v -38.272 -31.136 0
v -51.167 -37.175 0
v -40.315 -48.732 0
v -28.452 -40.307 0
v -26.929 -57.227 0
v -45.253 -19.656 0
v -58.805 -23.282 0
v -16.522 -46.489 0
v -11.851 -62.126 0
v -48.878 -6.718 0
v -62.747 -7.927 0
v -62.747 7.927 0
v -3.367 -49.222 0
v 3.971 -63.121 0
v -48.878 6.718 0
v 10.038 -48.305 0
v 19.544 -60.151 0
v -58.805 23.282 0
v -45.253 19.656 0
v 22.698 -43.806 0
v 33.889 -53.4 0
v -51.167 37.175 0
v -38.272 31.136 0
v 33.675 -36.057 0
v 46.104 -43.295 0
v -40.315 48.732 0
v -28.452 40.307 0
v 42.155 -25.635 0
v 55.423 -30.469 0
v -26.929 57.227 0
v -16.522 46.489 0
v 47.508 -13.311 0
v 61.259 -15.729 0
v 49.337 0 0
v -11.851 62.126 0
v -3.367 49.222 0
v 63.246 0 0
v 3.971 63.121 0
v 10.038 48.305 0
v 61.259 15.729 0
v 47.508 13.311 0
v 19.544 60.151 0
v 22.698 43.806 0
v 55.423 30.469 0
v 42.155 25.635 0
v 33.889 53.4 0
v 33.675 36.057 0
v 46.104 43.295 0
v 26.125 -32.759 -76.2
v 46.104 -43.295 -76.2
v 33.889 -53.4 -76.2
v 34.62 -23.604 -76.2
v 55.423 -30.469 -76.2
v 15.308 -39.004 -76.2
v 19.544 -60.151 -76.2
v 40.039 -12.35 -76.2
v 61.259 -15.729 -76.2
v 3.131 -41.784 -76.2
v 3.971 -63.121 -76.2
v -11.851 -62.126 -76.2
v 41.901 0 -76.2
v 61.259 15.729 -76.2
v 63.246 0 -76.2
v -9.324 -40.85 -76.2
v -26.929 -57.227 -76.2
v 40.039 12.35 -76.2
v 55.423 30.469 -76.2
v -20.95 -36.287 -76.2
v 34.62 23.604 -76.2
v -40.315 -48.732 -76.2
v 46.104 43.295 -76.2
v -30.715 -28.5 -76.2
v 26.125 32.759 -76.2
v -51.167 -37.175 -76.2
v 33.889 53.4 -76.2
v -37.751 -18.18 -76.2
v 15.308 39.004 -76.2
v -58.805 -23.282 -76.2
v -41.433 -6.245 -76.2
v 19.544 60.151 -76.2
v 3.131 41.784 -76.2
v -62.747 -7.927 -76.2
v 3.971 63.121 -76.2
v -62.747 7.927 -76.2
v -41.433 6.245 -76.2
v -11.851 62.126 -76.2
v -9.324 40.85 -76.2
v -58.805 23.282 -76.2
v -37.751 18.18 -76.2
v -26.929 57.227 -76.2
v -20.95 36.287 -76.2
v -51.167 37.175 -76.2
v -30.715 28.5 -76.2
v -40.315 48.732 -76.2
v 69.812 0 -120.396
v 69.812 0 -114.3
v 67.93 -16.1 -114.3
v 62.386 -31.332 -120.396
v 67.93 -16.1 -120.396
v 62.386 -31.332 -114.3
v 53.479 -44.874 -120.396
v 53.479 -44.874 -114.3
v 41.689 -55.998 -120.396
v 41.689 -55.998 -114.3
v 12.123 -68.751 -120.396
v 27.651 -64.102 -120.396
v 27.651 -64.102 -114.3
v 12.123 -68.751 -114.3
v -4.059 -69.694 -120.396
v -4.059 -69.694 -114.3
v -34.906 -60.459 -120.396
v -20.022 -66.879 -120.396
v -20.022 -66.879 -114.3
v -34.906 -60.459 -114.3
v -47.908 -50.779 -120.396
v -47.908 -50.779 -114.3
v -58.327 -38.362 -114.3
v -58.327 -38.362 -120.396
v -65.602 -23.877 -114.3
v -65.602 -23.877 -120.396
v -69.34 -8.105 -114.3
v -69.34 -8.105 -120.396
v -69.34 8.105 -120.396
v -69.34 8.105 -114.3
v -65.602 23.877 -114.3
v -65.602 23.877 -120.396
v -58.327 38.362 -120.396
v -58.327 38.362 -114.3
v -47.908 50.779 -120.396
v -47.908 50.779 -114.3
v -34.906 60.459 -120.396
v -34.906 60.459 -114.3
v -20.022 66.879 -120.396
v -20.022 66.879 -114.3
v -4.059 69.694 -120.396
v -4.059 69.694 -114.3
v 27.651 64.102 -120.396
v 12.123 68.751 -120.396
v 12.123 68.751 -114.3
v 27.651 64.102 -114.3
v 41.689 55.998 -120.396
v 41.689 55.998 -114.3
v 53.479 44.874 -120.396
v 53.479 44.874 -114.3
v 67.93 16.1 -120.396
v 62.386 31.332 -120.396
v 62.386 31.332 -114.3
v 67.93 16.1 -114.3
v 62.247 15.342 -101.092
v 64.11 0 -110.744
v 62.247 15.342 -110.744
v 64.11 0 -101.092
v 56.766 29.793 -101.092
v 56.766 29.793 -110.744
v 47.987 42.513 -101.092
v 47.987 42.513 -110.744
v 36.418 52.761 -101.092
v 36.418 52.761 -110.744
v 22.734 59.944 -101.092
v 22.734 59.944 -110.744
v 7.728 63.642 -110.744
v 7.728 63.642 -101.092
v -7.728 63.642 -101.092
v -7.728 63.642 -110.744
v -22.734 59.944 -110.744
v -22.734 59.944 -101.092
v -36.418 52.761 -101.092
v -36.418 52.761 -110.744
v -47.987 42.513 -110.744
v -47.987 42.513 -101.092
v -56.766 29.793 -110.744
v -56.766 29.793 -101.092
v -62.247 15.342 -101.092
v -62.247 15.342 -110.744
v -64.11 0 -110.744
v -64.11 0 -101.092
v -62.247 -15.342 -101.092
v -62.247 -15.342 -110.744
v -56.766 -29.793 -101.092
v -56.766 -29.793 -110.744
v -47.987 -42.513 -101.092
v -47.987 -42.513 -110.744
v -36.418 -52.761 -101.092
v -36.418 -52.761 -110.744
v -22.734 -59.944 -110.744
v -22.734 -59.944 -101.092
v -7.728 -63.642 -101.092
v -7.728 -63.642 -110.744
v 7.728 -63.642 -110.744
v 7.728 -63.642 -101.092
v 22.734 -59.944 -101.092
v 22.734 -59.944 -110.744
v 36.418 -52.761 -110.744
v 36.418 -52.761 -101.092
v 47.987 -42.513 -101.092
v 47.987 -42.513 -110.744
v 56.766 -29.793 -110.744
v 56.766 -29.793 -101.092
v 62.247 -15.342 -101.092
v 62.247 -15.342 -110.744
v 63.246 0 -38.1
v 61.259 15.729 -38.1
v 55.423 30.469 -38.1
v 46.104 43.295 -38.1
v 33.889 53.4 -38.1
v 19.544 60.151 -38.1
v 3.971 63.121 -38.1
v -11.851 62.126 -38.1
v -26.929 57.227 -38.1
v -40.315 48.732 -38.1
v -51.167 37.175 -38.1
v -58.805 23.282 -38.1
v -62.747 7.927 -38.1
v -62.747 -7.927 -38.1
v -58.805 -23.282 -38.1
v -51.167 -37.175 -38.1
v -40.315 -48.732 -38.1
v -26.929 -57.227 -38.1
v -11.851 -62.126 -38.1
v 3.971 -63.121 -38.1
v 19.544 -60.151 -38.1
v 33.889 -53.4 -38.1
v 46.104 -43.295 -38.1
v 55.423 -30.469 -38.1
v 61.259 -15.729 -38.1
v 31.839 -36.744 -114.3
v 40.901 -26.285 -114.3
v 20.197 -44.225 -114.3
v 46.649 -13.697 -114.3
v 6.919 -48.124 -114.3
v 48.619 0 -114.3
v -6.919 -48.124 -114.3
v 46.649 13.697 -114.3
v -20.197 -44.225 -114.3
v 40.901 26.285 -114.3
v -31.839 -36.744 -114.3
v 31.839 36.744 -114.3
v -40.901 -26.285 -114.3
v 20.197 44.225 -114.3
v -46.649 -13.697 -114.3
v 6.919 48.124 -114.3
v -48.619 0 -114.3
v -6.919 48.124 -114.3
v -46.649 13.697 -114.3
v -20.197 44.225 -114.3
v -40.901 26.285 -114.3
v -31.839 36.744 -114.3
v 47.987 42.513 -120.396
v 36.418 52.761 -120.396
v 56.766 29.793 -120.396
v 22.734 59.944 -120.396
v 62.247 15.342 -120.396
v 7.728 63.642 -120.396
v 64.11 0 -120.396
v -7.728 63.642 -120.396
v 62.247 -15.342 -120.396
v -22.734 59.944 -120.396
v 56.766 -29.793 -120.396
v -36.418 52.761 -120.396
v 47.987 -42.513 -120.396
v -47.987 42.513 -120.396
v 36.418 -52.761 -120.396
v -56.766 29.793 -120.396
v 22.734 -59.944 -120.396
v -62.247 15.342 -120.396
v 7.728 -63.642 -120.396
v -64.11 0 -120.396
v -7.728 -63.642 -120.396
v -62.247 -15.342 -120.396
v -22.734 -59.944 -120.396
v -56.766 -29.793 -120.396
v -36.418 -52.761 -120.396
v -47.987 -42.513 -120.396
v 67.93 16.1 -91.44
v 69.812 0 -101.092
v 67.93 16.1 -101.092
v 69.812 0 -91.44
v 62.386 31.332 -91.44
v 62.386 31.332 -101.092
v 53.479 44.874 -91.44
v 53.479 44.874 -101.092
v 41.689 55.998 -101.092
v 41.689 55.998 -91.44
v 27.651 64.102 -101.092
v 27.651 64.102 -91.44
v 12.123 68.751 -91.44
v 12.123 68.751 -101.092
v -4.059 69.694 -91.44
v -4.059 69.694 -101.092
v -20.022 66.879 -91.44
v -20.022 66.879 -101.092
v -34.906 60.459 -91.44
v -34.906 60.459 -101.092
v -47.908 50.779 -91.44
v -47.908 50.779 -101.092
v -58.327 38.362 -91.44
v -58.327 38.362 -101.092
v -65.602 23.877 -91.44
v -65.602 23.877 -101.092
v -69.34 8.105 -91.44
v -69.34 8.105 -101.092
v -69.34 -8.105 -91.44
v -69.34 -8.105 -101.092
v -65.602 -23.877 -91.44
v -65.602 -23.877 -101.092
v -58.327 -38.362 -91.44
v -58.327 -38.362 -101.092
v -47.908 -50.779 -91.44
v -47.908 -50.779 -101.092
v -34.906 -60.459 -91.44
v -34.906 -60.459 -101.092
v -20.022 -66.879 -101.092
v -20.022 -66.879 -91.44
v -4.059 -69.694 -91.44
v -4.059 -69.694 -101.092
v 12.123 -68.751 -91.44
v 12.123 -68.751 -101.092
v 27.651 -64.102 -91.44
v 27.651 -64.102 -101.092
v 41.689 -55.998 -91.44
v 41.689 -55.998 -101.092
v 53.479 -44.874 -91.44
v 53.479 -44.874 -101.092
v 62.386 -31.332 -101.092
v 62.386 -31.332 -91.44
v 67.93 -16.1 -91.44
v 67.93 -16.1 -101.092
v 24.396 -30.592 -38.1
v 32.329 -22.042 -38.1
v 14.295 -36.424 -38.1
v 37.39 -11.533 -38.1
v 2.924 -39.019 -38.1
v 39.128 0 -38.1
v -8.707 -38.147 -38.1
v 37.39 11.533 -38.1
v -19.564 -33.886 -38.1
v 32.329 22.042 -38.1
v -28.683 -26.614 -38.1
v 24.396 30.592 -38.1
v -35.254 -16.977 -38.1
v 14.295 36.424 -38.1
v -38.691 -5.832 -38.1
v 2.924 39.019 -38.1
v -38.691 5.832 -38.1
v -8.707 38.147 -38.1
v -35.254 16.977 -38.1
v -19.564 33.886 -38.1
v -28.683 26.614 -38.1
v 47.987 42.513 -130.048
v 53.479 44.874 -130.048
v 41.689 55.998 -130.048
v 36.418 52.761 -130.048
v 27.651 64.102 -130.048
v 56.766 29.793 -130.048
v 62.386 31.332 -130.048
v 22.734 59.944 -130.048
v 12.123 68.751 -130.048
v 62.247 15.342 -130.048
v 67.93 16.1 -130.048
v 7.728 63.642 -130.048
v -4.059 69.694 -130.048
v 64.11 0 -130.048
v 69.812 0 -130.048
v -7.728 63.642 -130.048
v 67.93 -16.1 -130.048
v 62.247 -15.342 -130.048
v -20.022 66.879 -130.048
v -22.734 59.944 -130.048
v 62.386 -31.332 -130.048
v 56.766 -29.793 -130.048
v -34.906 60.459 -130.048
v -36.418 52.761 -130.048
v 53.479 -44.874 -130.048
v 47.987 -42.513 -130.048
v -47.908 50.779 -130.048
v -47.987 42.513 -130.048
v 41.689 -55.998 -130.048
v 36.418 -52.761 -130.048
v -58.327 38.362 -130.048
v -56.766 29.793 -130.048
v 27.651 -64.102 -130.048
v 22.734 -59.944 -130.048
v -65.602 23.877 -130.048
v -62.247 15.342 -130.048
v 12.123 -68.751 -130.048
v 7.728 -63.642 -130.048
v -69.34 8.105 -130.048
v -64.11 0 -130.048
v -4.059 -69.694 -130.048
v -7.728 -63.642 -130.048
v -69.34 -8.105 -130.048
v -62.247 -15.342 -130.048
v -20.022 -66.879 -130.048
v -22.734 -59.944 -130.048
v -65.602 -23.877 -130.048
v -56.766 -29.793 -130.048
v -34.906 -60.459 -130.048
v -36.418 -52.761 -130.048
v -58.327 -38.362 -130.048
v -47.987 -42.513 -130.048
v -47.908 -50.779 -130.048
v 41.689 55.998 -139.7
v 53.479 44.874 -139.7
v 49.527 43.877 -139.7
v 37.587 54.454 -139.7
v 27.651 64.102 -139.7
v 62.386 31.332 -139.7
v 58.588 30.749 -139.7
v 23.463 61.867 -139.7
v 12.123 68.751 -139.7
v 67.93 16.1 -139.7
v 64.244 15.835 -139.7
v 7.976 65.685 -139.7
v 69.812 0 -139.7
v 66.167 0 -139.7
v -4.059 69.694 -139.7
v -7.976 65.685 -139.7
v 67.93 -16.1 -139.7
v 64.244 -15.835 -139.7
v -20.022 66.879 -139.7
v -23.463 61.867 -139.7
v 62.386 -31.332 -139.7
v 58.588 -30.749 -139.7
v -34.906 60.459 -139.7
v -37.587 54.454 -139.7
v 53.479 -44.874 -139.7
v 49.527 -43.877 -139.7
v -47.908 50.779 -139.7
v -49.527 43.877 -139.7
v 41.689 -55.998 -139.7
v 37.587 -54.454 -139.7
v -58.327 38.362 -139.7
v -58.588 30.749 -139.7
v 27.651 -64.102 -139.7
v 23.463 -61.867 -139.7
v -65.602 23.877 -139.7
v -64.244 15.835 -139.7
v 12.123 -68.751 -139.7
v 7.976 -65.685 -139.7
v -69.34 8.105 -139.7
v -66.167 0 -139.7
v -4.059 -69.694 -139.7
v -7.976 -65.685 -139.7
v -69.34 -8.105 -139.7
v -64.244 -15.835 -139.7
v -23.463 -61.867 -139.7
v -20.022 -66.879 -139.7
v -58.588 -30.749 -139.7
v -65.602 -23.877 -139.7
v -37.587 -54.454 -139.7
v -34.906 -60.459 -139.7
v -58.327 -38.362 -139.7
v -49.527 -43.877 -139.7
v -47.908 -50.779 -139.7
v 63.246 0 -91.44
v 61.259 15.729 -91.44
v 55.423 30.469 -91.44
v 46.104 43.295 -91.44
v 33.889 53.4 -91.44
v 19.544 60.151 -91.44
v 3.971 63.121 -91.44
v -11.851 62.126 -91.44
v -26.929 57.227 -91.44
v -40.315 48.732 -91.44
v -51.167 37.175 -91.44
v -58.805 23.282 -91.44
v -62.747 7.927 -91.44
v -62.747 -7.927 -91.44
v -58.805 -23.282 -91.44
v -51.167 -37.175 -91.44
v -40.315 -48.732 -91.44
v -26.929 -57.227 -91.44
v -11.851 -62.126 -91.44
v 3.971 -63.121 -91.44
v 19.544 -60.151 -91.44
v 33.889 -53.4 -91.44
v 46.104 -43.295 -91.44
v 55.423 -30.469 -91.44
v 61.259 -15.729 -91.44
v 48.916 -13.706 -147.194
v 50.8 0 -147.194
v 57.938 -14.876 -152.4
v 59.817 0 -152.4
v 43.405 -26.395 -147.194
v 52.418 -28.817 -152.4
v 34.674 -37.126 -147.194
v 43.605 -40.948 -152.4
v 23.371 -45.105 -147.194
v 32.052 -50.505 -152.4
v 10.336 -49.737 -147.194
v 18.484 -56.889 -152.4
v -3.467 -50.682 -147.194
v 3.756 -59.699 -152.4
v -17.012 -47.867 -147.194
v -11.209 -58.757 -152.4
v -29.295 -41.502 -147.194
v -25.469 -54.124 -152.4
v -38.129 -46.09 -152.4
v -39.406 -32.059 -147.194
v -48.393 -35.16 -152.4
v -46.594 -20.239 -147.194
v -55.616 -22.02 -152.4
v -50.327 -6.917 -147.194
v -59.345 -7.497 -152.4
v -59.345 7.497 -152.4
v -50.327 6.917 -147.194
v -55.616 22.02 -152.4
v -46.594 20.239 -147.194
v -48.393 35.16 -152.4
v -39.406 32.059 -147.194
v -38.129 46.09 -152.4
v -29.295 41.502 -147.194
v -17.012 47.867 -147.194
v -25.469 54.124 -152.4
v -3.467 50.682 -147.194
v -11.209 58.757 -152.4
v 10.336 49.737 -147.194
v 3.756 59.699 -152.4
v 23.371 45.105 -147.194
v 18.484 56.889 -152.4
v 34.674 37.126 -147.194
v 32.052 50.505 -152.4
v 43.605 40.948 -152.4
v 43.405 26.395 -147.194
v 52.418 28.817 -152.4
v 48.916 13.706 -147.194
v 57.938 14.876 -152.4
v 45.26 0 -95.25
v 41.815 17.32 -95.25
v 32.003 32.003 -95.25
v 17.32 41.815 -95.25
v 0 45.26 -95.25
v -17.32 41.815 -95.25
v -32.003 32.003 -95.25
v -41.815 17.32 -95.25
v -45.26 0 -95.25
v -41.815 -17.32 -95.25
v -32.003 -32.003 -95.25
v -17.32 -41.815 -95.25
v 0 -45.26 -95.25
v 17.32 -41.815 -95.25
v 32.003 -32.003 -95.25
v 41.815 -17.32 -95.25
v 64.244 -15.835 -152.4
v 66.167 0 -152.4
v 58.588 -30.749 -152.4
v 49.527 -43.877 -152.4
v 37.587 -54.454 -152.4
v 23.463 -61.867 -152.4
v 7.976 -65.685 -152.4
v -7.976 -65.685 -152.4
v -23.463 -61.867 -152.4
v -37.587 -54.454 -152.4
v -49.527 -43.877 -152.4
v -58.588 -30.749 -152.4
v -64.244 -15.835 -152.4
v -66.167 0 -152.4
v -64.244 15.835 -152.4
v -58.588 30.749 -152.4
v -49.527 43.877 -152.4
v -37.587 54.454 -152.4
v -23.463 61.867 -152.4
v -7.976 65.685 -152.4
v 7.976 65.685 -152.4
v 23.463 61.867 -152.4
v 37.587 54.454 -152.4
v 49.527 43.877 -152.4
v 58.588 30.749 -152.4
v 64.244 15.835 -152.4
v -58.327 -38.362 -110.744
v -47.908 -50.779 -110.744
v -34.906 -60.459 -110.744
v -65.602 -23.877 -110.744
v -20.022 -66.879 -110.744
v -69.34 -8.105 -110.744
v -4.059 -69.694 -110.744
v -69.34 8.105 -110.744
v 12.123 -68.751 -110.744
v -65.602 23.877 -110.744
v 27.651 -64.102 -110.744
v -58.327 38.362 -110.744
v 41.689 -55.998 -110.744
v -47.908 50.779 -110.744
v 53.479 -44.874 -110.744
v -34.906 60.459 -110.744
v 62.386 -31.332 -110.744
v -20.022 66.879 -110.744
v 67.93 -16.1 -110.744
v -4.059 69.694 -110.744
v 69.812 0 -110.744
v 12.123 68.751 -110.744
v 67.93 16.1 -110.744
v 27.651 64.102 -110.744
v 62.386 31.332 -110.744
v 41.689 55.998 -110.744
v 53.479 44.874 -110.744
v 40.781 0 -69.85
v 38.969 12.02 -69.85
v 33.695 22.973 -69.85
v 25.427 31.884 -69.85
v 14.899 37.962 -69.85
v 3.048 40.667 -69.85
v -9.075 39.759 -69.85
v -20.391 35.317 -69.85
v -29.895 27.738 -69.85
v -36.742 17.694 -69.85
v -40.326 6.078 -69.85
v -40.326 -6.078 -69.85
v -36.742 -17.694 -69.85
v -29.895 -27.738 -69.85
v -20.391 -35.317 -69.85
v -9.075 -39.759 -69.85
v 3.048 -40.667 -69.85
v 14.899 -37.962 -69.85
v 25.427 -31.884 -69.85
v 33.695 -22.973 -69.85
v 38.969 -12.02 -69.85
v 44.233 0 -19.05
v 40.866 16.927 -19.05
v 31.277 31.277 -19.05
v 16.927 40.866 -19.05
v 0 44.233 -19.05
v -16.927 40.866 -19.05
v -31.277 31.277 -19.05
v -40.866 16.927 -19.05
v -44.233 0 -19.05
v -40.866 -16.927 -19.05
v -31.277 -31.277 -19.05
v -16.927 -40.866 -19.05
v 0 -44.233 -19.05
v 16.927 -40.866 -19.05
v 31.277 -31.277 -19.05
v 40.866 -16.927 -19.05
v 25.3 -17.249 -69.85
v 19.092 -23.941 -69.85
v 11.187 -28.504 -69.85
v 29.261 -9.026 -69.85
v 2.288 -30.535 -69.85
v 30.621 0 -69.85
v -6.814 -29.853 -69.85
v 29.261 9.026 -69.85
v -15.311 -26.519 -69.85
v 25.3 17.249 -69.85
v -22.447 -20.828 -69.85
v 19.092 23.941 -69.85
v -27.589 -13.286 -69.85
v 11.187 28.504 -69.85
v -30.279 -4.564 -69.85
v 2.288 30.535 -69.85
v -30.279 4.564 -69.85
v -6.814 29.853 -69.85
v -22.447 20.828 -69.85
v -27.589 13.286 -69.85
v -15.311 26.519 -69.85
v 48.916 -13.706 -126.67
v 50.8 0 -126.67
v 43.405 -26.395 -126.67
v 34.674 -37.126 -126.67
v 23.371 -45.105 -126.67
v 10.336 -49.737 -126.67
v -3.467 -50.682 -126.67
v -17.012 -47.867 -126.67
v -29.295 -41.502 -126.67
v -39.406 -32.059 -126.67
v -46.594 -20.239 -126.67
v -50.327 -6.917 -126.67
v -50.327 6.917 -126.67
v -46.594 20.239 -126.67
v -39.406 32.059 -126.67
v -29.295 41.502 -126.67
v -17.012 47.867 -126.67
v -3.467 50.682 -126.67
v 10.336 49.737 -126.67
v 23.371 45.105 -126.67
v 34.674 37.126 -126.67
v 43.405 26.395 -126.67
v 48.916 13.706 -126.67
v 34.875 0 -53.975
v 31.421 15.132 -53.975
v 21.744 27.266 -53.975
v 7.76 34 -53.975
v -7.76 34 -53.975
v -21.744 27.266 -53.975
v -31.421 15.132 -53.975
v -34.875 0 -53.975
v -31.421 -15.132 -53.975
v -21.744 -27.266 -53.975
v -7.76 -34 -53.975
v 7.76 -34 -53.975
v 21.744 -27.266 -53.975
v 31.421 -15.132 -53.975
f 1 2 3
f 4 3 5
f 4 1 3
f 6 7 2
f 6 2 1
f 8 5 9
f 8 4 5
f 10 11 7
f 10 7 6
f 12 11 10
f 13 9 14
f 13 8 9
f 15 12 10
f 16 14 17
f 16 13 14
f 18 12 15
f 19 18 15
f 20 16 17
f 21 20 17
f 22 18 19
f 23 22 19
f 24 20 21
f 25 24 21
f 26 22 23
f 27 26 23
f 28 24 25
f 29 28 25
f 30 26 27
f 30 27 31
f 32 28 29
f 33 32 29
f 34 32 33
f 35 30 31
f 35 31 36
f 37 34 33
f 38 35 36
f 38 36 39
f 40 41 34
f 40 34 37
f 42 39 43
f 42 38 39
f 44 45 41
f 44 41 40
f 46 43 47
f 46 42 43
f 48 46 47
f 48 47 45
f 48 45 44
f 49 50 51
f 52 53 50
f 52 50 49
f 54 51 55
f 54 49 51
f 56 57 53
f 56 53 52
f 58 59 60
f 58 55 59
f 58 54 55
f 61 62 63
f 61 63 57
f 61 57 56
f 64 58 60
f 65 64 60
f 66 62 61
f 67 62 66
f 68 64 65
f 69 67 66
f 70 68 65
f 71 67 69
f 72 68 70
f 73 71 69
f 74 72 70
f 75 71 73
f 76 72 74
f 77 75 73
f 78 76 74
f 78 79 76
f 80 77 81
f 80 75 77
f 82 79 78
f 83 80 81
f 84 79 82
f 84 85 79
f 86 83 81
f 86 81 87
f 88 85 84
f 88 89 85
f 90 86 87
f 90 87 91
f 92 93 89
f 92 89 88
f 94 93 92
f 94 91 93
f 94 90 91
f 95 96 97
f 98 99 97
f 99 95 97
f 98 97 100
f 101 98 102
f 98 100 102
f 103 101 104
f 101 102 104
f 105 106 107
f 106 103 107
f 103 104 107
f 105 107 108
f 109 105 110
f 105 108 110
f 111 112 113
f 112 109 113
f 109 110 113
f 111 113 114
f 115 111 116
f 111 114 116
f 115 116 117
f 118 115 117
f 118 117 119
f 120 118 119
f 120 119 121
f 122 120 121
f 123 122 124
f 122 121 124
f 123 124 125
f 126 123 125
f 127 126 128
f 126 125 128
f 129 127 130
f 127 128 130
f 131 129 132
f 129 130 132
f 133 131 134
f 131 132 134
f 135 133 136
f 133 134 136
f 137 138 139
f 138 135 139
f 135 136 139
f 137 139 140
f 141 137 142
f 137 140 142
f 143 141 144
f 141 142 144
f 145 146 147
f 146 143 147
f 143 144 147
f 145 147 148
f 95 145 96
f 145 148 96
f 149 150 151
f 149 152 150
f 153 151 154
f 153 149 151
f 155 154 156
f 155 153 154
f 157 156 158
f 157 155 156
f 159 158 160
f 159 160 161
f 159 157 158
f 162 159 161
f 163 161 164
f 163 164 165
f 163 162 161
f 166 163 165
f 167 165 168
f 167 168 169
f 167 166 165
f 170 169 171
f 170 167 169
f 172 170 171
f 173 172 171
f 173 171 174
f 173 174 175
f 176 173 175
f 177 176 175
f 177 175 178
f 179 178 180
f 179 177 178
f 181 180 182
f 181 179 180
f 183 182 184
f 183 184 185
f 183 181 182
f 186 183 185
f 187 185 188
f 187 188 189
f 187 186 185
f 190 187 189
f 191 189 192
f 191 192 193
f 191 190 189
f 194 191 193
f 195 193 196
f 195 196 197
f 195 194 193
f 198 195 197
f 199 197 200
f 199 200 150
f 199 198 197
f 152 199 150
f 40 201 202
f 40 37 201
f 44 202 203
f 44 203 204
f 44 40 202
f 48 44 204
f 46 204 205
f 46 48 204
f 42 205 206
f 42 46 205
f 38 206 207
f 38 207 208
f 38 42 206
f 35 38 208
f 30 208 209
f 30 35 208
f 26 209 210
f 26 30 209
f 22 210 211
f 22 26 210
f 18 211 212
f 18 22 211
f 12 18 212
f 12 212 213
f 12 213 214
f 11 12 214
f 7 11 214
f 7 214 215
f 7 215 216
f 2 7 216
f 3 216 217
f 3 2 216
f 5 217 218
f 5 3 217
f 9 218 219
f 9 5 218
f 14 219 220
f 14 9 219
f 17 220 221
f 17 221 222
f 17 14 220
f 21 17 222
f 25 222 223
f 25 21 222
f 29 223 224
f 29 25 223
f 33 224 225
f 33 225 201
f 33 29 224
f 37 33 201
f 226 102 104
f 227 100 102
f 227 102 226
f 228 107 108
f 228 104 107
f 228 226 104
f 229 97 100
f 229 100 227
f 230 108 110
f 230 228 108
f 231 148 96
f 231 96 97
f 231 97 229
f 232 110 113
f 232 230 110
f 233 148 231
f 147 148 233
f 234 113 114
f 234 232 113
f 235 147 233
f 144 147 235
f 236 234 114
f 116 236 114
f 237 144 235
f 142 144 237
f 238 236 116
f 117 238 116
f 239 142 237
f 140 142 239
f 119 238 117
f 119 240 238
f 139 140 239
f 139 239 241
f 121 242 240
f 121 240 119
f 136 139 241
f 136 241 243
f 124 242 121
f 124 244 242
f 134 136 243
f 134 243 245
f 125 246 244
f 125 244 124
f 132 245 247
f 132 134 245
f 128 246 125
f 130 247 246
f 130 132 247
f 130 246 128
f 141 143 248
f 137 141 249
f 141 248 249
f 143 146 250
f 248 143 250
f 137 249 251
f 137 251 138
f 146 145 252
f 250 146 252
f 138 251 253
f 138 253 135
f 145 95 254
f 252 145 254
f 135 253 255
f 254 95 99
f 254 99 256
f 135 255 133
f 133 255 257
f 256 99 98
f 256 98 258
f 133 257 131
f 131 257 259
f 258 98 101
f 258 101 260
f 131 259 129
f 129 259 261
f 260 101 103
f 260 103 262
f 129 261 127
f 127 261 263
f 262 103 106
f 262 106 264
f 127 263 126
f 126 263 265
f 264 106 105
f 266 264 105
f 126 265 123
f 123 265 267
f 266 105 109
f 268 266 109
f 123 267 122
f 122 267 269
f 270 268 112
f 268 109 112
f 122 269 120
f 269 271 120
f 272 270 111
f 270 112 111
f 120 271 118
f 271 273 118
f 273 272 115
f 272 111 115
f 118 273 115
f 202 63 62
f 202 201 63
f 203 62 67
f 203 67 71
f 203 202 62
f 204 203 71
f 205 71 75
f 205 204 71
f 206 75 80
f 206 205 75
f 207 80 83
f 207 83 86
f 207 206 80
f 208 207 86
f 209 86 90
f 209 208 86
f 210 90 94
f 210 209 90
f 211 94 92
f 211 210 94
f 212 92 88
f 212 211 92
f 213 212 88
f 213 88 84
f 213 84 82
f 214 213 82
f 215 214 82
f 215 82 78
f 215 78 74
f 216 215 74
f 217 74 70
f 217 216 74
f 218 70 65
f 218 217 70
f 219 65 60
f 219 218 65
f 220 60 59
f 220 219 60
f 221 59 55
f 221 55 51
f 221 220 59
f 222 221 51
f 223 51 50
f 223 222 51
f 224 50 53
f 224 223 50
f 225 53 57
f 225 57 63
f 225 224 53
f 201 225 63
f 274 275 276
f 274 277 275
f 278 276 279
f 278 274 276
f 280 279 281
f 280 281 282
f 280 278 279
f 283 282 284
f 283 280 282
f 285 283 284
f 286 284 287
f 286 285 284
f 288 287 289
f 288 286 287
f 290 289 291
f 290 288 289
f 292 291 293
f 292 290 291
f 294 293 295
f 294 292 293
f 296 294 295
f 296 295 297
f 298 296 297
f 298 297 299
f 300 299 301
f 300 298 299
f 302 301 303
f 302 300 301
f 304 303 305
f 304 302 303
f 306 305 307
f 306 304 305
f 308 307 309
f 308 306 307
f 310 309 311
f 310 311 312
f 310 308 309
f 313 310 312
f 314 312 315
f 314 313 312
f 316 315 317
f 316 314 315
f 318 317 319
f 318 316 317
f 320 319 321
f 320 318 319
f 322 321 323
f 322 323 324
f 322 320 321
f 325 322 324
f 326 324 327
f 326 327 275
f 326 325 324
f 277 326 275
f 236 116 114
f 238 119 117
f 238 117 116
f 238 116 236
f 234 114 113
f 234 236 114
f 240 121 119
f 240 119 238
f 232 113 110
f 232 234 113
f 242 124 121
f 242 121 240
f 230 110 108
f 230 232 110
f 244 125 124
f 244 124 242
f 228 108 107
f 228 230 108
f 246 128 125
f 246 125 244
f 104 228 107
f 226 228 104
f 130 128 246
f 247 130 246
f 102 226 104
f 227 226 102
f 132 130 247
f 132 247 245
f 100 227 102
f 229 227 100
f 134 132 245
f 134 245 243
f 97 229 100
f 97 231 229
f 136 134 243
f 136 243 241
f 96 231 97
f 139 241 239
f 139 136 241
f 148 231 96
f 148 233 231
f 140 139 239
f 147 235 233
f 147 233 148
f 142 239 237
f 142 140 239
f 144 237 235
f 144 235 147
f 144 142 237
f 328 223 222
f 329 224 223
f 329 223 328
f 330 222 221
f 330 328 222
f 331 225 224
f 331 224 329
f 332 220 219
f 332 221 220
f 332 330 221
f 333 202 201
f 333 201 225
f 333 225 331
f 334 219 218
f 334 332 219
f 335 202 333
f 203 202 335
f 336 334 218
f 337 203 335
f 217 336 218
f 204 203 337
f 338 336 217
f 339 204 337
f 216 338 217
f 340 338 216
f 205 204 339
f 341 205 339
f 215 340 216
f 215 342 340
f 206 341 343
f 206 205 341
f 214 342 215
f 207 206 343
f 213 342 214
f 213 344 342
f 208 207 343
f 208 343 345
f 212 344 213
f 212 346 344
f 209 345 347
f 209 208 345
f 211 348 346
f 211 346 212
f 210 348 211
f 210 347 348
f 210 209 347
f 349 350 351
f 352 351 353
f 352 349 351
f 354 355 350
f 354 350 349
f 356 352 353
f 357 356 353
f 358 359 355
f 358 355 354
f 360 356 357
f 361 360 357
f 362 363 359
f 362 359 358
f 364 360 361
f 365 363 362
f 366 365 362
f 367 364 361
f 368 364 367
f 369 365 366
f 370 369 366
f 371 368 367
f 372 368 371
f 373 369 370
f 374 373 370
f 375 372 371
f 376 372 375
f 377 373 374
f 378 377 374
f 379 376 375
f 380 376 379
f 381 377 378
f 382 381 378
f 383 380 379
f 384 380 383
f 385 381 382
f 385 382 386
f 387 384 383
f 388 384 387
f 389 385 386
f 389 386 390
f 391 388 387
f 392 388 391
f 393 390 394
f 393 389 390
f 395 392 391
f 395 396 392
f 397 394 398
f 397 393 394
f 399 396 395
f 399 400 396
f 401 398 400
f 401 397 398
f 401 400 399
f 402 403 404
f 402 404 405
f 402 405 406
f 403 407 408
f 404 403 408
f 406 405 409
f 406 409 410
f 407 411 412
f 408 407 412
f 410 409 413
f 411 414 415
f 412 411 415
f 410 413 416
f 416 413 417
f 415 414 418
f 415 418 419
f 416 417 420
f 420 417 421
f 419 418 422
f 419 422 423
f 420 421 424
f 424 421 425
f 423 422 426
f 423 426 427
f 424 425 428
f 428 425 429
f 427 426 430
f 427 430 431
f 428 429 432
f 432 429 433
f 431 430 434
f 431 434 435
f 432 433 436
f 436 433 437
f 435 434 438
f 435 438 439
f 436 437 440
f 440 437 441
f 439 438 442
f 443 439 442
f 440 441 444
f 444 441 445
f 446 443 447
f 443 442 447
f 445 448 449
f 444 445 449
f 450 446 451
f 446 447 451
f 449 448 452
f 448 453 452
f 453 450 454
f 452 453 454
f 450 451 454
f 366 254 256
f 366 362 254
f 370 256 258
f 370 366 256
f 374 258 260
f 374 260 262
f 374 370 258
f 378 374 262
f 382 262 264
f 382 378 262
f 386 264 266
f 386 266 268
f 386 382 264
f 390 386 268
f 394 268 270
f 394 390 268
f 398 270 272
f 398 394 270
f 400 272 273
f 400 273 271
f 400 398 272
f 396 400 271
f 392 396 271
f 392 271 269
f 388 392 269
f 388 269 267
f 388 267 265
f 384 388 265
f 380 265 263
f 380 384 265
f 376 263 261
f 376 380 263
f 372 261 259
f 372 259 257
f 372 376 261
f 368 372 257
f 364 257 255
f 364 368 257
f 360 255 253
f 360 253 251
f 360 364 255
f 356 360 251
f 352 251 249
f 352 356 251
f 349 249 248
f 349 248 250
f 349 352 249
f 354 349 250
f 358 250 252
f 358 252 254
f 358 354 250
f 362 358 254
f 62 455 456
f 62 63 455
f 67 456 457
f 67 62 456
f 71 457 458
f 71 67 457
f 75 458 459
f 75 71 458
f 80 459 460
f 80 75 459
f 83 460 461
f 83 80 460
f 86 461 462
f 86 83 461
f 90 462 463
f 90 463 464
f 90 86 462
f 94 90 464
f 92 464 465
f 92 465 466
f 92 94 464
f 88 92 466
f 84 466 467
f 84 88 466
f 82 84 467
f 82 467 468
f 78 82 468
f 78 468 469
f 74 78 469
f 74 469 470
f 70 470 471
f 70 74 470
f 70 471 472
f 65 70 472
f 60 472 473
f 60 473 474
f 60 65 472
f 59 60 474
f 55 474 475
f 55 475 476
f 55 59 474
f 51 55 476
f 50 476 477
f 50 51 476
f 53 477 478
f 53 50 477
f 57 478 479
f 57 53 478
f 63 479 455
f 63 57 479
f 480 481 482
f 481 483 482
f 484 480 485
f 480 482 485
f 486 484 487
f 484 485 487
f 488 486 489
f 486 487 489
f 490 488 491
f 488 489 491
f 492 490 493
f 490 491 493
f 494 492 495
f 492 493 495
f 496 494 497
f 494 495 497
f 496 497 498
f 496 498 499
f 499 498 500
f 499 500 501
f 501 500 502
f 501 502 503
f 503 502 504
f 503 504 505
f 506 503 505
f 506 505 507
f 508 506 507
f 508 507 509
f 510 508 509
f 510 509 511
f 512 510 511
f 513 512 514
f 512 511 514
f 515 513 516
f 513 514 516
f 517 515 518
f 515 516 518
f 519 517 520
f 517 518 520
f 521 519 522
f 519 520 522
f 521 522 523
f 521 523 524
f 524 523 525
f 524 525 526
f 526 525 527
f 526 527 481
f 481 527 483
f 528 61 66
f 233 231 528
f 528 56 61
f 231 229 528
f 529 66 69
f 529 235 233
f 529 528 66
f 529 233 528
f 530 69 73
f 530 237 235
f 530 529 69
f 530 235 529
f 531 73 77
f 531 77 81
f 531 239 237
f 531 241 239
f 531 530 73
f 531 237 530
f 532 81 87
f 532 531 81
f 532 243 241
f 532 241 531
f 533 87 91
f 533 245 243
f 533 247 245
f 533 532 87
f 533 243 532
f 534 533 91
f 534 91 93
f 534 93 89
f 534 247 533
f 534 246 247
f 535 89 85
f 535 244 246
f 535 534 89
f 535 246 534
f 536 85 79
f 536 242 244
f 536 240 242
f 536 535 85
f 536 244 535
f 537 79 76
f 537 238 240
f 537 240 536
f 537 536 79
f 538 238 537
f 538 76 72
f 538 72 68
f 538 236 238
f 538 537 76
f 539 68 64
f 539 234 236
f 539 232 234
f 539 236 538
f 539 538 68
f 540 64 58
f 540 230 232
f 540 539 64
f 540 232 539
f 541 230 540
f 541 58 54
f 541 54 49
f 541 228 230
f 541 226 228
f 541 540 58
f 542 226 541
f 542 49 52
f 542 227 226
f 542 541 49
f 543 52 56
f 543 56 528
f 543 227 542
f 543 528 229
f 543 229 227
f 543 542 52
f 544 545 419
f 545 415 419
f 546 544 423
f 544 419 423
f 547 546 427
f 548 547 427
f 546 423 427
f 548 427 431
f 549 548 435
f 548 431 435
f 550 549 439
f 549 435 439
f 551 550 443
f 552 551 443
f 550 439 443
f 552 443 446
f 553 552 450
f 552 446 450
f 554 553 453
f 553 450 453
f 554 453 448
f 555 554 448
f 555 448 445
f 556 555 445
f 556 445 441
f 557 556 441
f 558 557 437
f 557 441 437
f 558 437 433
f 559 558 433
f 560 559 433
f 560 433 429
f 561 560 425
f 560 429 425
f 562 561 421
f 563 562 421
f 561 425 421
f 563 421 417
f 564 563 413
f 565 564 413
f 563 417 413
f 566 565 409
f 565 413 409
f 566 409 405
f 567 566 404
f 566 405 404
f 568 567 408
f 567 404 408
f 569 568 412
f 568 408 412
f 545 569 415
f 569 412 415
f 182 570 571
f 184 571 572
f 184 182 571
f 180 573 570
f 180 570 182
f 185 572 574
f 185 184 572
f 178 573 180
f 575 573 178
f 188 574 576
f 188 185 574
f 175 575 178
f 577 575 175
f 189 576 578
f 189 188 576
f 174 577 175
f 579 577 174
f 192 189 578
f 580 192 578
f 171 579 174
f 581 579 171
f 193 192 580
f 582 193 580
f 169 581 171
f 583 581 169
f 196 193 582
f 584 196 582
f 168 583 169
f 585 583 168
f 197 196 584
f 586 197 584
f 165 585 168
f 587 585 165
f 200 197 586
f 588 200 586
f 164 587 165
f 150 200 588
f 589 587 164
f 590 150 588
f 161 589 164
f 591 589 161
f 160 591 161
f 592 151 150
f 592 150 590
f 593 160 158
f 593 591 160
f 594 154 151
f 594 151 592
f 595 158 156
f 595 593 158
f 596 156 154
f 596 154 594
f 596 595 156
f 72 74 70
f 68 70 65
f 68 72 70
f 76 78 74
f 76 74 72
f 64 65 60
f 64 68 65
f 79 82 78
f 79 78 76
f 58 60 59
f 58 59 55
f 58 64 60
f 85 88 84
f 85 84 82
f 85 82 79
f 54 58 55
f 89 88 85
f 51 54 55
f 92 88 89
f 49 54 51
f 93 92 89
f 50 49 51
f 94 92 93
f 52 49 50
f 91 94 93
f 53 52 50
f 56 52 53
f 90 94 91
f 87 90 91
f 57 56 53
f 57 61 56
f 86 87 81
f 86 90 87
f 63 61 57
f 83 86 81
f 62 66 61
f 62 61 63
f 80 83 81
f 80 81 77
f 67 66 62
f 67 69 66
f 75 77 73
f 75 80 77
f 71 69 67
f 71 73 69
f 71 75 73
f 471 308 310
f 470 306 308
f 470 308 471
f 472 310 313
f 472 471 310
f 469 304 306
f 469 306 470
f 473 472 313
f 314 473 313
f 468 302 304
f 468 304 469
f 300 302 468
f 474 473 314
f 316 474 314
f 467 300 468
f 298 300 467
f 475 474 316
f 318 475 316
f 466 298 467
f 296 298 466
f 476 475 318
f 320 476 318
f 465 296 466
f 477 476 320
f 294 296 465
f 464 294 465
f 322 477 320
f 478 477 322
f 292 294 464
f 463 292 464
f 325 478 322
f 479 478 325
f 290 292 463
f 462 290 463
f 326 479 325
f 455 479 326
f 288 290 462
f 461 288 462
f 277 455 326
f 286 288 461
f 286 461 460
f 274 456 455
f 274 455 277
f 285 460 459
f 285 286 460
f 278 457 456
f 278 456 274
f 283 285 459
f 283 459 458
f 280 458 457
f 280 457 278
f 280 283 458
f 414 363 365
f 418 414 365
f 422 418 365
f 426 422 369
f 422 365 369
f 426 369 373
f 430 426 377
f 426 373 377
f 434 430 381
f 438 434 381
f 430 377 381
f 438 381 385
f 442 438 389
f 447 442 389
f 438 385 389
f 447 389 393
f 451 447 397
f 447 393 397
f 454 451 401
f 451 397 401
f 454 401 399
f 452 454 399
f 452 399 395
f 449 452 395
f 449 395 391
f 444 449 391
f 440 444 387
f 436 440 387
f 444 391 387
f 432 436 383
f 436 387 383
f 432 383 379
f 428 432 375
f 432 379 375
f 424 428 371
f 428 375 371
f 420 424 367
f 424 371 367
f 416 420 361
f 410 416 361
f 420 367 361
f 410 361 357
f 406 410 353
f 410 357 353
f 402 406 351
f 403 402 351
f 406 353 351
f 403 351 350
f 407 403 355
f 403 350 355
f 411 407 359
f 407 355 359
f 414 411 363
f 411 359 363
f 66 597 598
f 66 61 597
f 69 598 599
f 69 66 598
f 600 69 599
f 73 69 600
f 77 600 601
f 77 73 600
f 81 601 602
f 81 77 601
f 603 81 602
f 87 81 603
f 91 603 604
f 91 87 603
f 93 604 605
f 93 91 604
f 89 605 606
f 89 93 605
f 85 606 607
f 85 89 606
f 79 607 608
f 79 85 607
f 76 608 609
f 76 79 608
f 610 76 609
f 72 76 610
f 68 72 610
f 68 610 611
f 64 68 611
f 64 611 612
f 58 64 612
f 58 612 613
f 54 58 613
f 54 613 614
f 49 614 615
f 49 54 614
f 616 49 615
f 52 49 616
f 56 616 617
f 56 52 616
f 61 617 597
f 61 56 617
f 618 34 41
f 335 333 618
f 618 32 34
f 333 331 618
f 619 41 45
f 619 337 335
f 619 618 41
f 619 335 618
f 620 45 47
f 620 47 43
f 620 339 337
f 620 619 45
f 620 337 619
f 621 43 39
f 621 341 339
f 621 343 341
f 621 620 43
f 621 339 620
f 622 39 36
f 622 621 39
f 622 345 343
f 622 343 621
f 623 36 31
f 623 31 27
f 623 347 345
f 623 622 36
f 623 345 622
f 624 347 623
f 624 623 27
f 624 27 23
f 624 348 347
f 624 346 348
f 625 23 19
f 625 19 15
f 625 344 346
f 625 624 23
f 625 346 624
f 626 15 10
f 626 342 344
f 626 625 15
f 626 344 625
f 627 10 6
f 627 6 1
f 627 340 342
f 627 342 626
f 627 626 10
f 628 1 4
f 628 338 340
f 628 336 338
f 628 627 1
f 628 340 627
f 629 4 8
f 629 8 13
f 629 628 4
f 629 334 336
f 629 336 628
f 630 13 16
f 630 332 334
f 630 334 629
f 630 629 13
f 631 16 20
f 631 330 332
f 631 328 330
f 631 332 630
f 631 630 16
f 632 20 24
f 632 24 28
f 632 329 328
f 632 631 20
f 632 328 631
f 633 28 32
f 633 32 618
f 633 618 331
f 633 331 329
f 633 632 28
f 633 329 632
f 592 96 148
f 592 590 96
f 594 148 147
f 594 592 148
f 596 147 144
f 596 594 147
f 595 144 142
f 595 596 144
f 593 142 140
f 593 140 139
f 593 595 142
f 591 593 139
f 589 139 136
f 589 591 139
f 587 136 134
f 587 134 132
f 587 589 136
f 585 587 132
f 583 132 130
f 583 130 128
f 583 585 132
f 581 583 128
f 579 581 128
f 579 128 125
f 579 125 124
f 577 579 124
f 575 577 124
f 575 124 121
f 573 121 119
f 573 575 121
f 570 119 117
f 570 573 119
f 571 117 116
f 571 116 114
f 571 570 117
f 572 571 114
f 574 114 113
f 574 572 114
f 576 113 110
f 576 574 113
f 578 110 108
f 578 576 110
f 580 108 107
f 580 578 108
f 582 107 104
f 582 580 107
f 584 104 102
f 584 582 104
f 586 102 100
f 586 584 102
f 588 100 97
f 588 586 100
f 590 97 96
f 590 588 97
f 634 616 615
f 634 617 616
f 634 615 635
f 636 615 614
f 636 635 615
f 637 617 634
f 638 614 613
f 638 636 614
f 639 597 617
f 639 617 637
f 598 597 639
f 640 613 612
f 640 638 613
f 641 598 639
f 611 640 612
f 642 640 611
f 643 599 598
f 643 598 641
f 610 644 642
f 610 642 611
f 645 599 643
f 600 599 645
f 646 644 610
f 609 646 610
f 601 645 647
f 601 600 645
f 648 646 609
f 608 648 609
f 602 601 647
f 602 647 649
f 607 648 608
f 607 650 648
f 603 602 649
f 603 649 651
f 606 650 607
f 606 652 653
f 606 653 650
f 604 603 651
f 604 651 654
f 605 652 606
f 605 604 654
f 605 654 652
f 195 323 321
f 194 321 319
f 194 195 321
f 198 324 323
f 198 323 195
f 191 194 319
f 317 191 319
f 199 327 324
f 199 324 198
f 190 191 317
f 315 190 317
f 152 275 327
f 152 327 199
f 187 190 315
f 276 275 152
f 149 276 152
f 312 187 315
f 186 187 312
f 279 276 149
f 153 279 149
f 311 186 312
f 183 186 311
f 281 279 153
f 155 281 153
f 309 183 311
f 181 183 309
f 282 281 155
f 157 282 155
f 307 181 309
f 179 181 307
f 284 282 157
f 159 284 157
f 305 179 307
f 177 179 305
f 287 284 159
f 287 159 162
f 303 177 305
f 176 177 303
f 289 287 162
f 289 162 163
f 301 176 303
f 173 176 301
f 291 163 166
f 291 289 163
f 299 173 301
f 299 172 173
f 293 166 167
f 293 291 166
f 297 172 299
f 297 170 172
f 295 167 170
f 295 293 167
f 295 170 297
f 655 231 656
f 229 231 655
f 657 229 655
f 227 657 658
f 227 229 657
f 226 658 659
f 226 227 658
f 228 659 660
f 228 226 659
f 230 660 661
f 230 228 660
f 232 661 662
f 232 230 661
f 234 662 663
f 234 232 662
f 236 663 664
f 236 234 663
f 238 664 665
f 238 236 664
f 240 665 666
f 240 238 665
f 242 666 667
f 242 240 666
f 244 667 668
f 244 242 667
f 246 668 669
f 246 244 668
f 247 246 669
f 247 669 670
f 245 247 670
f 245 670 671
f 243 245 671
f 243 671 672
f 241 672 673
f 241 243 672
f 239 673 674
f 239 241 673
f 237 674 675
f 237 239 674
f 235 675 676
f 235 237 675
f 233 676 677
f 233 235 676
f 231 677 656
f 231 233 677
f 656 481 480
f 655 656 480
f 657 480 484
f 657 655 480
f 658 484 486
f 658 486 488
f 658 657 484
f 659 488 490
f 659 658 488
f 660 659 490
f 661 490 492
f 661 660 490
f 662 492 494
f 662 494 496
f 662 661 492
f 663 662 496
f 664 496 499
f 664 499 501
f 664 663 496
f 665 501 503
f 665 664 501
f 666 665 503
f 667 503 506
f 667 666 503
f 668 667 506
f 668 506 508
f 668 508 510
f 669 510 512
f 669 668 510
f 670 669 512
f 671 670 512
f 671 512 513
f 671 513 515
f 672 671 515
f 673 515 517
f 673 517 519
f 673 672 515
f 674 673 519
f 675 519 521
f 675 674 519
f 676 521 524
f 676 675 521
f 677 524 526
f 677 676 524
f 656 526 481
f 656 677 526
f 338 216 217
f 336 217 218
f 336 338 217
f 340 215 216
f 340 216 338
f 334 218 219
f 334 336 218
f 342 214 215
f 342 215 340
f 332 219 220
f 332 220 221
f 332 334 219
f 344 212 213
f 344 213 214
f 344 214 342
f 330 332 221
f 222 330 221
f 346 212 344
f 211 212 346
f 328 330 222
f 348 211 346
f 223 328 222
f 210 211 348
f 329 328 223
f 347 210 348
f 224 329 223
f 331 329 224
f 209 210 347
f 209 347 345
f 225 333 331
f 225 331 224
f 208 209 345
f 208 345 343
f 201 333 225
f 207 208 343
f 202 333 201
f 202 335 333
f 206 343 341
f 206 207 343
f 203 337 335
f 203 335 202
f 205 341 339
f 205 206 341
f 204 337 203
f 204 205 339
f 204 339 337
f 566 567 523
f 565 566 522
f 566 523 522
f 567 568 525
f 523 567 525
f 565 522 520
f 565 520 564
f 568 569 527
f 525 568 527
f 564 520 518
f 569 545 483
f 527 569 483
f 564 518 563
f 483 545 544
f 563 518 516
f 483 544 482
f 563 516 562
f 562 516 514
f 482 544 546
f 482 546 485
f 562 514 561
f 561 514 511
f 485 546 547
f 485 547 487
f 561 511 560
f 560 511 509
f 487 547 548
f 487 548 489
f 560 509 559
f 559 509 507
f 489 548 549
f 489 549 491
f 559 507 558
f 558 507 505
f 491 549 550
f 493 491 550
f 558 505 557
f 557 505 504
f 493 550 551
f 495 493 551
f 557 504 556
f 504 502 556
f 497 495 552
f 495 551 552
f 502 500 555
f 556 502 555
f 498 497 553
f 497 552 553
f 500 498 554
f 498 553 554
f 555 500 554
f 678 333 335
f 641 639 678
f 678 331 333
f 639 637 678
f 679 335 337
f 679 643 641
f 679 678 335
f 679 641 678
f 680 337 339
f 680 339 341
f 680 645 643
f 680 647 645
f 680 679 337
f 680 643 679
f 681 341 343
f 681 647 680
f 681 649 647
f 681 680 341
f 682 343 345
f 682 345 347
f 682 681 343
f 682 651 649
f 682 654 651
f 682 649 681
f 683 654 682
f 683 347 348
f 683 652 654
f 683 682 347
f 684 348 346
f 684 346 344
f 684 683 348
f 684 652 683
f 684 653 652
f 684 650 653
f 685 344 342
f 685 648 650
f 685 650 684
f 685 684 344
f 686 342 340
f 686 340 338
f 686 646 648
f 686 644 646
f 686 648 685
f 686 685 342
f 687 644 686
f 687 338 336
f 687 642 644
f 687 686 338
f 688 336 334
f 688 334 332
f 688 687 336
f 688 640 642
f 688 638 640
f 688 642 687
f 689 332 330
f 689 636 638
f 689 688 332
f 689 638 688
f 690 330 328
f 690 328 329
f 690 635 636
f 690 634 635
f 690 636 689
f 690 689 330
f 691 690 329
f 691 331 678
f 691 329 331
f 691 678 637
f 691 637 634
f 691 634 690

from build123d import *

# Parameters (mm, degrees)
SKETCH2_W          = 6.35
SKETCH2_H          = 9.652
SPLIT1_START       = -114.3
SPLIT1_2_OUTLINE_R = 69.8119
SPLIT1_2_DEPTH     = 114.3


# Read off the part's stored shape, not the designer's step: Split1
with BuildPart() as part:
    # Sketch1 → Revolve1 (revolve)
    with BuildSketch(Plane(origin=(0, 0, 0), x_dir=(1, 0, 0), z_dir=(0, 1, 0))):
        Polygon((69.8119, 139.7), (69.8119, 91.44), (63.246, 91.44), (63.246, 0), (49.337302706, 0), (17.145, 120.143309313), (17.145, 127.763309313), (59.817, 152.4), (66.167, 152.4), (66.167, 139.7), align=None)
    revolve(axis=Axis((0, 0, 8.145225657), (0, 0, -1)))

    # Sketch2 → Cut-Revolve1 (revolve, cut)
    with BuildSketch(Plane(origin=(0, 0, 0), x_dir=(1, 0, 0), z_dir=(0, 1, 0))):
        with Locations((67.2846, 125.222)):
            Rectangle(SKETCH2_W, SKETCH2_H)
        with Locations((67.2846, 105.918)):
            Rectangle(SKETCH2_W, SKETCH2_H)
    revolve(axis=Axis((0, 0, 8.145225657), (0, 0, -1)), mode=Mode.SUBTRACT)

    # Sketch3 → Cut-Revolve2 (revolve, cut)
    with BuildSketch(Plane(origin=(0, 0, 0), x_dir=(1, 0, 0), z_dir=(0, 1, 0))):
        Polygon((50.8, 147.194032623), (50.8, 126.670279827), (40.781051615, 69.85), (30.621051615, 69.85), (17.145, 120.143309313), (17.145, 127.763309313), align=None)
    revolve(axis=Axis((0, 0, 8.145225657), (0, 0, -1)), mode=Mode.SUBTRACT)

    # Split1 2 outline → Split1 2 (cut)
    with BuildSketch(Plane.XY.offset(SPLIT1_START)):
        Circle(SPLIT1_2_OUTLINE_R)
    extrude(amount=SPLIT1_2_DEPTH, mode=Mode.SUBTRACT)


with BuildPart() as body_2:
    # Split1 outline → Split1 (revolve)
    with BuildSketch(Plane.XZ):
        Polygon((49.337302706, 0), (39.128438475, -38.1), (63.246, -38.1), (63.246, 0), align=None)
    revolve(axis=Axis((0, 0, 0), (0, 0, 1)))


with BuildPart() as body_3:
    # Split1 3 outline → Split1 3 (revolve)
    with BuildSketch(Plane.XZ):
        Polygon((40.781051615, -69.85), (41.900727943, -76.2), (63.246, -76.2), (63.246, -38.1), (39.128438475, -38.1), (30.621051615, -69.85), align=None)
    revolve(axis=Axis((0, 0, 0), (0, 0, 1)))


with BuildPart() as body_4:
    # Split1 4 outline → Split1 4 (revolve)
    with BuildSketch(Plane.XZ):
        Polygon((41.900727943, -76.2), (48.618785908, -114.3), (69.8119, -114.3), (69.8119, -110.744), (64.1096, -110.744), (64.1096, -101.092), (69.8119, -101.092), (69.8119, -91.44), (63.246, -91.44), (63.246, -76.2), align=None)
    revolve(axis=Axis((0, 0, 0), (0, 0, 1)))


solid = Compound([part.part, body_2.part, body_3.part, body_4.part])
